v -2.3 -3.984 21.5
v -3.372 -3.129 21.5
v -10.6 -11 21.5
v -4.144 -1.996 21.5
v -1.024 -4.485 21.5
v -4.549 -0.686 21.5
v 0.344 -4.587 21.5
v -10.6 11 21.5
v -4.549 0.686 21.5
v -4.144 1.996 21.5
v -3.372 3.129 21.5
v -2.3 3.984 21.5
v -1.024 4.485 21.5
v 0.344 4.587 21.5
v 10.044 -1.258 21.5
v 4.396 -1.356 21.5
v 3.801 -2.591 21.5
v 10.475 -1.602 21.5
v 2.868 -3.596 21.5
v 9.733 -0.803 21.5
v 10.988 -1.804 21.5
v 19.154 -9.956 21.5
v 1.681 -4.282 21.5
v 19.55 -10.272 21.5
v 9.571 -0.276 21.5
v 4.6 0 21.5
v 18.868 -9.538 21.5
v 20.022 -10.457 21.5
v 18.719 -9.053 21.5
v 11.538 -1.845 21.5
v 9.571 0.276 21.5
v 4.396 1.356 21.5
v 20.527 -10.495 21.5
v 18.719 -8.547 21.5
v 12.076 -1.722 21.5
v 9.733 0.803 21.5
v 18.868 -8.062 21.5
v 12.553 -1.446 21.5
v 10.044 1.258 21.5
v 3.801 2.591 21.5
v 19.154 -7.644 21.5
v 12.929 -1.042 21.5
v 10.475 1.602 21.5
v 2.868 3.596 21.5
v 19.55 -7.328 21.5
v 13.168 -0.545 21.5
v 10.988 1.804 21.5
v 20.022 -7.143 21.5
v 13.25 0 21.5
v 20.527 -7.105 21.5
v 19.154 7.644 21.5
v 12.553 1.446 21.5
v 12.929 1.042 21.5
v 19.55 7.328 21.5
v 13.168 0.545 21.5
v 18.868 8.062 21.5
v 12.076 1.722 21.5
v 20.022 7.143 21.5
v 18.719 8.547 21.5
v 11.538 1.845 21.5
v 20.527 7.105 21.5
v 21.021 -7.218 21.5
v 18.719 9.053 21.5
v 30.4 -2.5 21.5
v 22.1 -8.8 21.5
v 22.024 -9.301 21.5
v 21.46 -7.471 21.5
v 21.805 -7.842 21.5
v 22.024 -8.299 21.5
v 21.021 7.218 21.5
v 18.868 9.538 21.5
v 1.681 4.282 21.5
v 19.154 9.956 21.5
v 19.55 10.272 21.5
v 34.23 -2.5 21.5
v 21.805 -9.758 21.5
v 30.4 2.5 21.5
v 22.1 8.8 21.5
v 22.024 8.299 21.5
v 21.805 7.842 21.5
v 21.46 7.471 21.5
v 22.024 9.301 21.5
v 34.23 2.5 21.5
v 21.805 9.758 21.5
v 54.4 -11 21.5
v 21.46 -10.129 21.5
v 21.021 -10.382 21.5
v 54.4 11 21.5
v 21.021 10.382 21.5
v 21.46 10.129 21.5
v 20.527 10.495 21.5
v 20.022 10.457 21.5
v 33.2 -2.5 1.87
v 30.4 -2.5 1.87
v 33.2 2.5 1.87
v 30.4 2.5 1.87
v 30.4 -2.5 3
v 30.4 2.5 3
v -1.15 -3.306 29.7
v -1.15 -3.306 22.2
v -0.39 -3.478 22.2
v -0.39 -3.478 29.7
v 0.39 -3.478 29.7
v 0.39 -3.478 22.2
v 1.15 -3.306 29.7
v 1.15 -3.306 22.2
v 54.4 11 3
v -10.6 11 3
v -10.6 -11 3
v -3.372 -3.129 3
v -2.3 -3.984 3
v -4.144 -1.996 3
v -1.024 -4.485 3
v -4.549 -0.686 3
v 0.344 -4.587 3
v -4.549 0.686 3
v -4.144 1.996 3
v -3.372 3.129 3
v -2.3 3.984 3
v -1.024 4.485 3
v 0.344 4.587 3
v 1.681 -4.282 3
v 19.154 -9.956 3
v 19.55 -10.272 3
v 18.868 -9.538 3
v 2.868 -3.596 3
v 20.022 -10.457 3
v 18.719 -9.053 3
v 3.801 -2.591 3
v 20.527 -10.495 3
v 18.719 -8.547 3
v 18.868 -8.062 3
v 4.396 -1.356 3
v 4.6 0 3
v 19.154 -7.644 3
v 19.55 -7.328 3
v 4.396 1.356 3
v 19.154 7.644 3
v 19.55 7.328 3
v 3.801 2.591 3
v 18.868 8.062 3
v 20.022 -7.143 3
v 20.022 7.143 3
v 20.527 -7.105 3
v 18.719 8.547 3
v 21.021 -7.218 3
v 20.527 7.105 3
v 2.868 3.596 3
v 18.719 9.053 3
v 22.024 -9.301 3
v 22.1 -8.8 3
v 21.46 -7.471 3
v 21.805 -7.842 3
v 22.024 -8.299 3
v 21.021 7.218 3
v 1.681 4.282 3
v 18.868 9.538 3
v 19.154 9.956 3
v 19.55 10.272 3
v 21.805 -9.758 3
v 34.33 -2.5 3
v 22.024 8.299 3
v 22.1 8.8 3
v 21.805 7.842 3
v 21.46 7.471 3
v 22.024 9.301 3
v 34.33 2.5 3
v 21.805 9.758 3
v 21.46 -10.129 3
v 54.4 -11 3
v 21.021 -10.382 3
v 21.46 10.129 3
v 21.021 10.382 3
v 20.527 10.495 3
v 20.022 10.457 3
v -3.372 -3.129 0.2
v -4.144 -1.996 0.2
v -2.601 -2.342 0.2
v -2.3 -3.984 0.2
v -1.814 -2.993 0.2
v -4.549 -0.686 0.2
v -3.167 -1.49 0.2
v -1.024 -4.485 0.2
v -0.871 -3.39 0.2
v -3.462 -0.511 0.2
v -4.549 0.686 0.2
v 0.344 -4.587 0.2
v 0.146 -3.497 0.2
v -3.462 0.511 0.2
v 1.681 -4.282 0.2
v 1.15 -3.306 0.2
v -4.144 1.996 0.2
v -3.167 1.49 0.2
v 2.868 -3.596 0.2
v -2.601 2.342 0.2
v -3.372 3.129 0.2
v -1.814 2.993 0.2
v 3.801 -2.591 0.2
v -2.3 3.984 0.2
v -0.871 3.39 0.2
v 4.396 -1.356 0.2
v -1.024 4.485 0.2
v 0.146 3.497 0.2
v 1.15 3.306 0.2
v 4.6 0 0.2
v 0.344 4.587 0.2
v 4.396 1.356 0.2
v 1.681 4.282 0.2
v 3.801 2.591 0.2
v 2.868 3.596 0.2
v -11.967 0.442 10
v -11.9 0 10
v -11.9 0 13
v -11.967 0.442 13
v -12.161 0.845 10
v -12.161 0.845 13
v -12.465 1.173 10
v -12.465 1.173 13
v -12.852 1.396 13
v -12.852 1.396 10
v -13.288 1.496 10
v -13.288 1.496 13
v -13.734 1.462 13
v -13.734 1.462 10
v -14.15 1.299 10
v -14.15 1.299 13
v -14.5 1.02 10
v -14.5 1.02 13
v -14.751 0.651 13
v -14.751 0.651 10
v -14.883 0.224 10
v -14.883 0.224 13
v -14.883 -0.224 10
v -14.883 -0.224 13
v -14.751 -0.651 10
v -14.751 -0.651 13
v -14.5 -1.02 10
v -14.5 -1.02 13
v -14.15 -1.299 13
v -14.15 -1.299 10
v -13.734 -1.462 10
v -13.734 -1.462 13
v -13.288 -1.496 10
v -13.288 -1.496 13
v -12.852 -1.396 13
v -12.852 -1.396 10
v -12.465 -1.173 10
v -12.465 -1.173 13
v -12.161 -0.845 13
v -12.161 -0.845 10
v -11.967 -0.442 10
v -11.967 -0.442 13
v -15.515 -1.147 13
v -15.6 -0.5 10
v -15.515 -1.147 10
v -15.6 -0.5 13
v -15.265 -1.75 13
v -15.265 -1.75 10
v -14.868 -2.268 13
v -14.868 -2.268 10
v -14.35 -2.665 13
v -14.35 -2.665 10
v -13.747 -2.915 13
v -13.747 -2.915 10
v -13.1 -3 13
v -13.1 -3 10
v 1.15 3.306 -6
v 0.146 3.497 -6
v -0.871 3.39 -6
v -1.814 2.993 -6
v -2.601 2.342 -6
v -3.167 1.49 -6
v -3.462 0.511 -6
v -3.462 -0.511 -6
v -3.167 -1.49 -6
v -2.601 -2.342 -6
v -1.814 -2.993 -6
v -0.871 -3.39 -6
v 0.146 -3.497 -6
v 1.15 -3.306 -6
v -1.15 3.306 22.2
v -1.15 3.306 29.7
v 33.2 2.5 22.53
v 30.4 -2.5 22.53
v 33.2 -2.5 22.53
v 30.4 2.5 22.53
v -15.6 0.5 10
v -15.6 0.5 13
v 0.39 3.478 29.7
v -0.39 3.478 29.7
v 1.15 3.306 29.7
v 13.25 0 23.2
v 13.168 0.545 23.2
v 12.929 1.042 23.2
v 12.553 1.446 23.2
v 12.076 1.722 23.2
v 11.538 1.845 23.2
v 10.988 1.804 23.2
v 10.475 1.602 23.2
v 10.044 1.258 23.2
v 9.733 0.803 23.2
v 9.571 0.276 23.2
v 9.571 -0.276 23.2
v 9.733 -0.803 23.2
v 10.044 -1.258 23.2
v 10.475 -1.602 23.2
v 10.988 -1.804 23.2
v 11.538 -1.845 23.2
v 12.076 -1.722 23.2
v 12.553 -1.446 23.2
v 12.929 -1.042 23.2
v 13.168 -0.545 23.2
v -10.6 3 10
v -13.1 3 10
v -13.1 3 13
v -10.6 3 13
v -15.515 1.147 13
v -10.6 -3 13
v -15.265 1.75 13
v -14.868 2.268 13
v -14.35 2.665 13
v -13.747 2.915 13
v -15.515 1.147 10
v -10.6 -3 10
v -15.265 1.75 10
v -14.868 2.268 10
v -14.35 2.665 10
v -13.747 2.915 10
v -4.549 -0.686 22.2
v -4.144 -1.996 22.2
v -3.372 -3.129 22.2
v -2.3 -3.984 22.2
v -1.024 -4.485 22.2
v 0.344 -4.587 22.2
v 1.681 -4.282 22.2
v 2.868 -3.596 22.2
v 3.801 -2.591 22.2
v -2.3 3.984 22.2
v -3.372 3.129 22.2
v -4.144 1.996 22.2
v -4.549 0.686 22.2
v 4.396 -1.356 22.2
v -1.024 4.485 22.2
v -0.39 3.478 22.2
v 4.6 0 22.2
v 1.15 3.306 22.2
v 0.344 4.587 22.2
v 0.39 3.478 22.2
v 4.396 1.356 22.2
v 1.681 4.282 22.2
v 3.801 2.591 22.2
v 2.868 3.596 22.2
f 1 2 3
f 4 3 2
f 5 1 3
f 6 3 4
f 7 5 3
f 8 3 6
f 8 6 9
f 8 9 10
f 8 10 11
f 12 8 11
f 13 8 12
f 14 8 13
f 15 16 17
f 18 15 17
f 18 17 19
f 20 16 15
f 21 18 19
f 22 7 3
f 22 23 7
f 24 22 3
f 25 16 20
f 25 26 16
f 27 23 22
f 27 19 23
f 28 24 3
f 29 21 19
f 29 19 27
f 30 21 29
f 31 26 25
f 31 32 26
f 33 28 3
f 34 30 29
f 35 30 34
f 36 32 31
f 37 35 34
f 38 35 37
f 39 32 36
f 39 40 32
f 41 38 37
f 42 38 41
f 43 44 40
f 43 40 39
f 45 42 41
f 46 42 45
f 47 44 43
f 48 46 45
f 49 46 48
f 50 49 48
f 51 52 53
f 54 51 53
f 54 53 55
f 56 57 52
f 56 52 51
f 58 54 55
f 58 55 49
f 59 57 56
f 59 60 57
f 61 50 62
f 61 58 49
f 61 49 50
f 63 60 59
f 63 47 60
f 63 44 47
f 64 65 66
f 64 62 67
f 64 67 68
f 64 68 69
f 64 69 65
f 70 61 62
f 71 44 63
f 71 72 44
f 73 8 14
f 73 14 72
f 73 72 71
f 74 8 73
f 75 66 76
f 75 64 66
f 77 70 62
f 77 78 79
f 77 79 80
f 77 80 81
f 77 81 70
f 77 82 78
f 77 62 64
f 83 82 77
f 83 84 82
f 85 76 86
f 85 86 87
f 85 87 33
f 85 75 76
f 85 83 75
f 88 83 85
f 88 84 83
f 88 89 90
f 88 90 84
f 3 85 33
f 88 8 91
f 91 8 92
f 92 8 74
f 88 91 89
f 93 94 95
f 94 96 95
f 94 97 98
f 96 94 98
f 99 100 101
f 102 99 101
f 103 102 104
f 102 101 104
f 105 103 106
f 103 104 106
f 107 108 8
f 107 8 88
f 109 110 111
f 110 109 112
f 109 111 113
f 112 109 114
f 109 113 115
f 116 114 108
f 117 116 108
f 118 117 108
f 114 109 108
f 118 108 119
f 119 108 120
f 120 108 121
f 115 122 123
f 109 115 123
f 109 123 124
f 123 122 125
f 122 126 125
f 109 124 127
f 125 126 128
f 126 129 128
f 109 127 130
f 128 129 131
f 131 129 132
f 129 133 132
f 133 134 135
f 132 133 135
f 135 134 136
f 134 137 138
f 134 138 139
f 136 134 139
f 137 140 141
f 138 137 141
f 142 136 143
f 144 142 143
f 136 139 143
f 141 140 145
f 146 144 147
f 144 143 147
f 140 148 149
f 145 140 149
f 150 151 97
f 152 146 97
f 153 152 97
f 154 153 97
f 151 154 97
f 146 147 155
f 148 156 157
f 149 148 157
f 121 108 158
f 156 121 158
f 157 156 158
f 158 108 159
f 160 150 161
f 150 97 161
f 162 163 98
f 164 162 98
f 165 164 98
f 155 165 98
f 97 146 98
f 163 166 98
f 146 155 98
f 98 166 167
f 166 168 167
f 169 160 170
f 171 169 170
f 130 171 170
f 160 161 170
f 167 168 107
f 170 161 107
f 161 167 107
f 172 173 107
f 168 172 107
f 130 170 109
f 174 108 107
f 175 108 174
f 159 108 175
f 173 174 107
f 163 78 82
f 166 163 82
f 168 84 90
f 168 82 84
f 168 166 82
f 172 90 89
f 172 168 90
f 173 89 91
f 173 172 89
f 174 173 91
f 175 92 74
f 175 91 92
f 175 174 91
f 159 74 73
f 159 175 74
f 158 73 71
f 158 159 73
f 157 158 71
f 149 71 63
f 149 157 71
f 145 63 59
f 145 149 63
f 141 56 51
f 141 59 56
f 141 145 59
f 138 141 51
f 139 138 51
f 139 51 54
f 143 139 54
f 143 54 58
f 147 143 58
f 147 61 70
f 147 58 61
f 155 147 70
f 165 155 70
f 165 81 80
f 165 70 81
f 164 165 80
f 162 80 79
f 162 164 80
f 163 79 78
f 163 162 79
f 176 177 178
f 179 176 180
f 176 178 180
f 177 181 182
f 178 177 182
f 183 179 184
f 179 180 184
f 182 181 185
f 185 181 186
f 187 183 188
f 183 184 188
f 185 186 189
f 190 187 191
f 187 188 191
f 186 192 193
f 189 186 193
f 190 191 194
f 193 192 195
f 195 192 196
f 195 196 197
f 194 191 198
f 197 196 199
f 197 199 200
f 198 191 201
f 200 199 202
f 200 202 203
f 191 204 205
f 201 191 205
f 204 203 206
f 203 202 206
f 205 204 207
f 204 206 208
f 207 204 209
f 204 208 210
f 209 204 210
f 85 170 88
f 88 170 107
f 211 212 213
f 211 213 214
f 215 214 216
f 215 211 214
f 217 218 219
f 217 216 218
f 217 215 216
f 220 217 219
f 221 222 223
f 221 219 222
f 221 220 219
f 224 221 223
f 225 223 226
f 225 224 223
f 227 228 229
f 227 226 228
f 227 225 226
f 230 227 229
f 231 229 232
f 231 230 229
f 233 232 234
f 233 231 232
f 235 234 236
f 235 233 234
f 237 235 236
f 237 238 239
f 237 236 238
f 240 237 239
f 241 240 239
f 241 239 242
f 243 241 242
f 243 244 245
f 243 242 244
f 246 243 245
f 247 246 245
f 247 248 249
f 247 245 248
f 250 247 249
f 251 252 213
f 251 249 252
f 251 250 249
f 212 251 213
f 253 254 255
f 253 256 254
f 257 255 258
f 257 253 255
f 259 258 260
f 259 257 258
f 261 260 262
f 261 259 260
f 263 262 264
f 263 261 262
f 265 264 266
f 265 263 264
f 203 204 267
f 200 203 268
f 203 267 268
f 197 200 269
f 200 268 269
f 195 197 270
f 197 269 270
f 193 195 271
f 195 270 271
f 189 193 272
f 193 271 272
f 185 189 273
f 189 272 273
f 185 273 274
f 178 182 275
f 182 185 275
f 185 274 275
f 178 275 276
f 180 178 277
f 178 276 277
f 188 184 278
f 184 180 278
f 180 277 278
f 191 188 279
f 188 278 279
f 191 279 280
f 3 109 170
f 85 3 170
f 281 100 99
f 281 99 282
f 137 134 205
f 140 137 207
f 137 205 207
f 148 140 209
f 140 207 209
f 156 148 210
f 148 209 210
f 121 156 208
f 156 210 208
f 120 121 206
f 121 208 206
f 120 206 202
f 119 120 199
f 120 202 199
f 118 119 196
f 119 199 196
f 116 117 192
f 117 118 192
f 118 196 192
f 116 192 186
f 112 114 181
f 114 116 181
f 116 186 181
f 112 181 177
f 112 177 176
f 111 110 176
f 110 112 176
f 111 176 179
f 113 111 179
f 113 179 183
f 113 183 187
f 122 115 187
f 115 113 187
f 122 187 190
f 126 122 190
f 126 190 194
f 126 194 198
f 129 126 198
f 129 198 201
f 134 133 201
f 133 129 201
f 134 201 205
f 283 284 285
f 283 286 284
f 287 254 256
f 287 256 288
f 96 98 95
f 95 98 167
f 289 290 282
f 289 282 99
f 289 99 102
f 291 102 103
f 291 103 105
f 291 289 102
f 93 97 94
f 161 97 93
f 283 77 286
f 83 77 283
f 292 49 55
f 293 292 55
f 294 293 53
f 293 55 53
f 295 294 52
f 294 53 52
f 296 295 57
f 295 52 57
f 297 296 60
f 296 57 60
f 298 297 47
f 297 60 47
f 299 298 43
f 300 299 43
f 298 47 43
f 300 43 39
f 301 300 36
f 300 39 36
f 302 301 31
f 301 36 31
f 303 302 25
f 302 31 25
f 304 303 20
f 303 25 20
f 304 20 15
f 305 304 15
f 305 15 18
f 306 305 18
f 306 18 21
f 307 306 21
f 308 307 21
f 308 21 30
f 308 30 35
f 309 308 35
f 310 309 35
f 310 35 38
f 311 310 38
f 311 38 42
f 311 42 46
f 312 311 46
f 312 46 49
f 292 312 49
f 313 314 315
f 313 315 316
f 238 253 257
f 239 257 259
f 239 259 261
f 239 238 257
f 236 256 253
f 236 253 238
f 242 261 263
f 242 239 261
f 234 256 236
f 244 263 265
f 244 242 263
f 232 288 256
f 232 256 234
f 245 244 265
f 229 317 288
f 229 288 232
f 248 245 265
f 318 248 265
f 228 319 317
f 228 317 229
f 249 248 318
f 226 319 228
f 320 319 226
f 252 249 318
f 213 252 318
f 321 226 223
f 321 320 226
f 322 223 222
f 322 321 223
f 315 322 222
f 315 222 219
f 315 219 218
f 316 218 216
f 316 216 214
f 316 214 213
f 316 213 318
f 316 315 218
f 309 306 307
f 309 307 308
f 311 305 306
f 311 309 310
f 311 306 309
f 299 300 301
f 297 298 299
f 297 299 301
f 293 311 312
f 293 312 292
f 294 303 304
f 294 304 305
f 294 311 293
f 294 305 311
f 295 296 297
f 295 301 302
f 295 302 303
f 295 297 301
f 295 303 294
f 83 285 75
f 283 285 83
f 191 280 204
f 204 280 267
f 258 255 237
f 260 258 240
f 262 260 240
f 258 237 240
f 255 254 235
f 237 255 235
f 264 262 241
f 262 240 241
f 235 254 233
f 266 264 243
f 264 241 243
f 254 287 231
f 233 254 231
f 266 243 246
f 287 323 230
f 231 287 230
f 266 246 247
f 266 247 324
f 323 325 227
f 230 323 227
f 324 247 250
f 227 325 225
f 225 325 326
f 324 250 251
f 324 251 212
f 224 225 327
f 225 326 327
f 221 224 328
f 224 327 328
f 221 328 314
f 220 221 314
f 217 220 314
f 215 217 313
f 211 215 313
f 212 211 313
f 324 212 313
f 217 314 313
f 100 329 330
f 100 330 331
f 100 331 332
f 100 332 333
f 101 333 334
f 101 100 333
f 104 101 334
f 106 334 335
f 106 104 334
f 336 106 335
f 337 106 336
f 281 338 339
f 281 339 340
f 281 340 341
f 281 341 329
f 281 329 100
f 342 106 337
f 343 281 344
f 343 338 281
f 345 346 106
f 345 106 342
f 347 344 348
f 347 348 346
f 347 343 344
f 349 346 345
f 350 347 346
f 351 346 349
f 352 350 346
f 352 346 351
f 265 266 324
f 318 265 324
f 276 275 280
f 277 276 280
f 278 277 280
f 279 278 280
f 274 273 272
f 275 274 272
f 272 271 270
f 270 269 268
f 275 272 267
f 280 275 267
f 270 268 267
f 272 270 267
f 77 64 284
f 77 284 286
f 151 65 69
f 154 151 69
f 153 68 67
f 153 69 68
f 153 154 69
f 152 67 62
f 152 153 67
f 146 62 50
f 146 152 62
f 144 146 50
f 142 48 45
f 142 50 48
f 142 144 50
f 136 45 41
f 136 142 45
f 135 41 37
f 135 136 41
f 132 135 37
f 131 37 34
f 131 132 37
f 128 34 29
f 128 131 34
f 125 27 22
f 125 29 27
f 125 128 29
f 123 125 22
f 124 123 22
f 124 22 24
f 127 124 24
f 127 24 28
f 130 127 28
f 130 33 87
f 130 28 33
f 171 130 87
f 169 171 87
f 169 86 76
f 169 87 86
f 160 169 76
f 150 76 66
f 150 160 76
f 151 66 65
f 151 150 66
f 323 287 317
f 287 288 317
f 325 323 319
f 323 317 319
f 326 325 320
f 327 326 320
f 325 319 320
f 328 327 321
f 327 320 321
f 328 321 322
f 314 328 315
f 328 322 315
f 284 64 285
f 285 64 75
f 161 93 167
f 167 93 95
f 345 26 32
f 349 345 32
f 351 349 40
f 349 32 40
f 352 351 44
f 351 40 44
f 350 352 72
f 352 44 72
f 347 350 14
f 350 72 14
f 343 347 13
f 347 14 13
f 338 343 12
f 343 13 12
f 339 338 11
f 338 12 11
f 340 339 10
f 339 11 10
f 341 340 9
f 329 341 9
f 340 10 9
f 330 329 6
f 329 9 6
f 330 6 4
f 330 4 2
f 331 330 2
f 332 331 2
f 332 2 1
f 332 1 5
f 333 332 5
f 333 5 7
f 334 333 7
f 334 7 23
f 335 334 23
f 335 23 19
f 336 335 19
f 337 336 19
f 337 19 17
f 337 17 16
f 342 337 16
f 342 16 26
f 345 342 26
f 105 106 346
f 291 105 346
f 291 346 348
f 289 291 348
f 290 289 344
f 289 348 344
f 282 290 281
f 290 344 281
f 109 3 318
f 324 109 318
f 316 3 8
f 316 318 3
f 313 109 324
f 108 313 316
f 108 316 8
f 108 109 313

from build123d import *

# Parameters (mm, degrees)
BOX007_W          = 4.3
BOX007_H          = 5
BOX007_DEPTH      = 2
CHAMFER001_SIZE   = 1.5
BOX006_W          = 4.3
BOX006_H          = 5
BOX006_DEPTH      = 2
CHAMFER_SIZE      = 1.5
BOX003_W          = 10
BOX003_H          = 10
BOX003_DEPTH      = 40
BOX002_W          = 10
BOX002_H          = 10
BOX002_DEPTH      = 40
CYLINDER010_R     = 3.5
CYLINDER010_DEPTH = 35.7
CYLINDER008_R     = 4.6
CYLINDER008_DEPTH = 22
CYLINDER006_R     = 1.85
CYLINDER006_DEPTH = 10
CYLINDER003_R     = 1.7
CYLINDER003_DEPTH = 50
CYLINDER002_R     = 1.7
CYLINDER002_DEPTH = 50
CYLINDER_R        = 1.5
CYLINDER_DEPTH    = 10
BOX001_W          = 10
BOX001_H          = 6
BOX001_DEPTH      = 3
FILLET_R          = 2.5
FILLET001_R       = 2.5
BOX_W             = 65
BOX_H             = 22
BOX_DEPTH         = 18.5


with BuildPart() as chamfer001:
    # Box007 → Box007 (new body)
    with BuildSketch(Plane(origin=(41, -2.5, 17.53), x_dir=(1, 0, 0), z_dir=(0, 0, 1))):
        with Locations((2.15, 2.5)):
            Rectangle(BOX007_W, BOX007_H)
    extrude(amount=BOX007_DEPTH)

    # Chamfer001
    chamfer001_edges = [chamfer001.edges().sort_by_distance(p)[0] for p in [
        (45.3, 0, 19.53),
    ]]
    chamfer(chamfer001_edges, length=CHAMFER001_SIZE)


with BuildPart() as part_mirroring:
    # Part__Mirroring: instance of Chamfer001
    add(chamfer001.part.mirror(Plane(origin=(0, 0, 0), x_dir=(0, 1, 0), z_dir=(0, 0, 1))))


with BuildPart() as part_mirroring_1:
    # Part__Mirroring placement: moved
    add(part_mirroring.part.moved(Location((0, 0, 18.4))))


with BuildPart() as fusion004:
    # Box006 → Box006 (new body)
    with BuildSketch(Plane(origin=(41, -2.5, 17.53), x_dir=(1, 0, 0), z_dir=(0, 0, 1))):
        with Locations((2.15, 2.5)):
            Rectangle(BOX006_W, BOX006_H)
    extrude(amount=BOX006_DEPTH)

    # Chamfer
    chamfer_edges = [fusion004.edges().sort_by_distance(p)[0] for p in [
        (45.3, 0, 19.53),
    ]]
    chamfer(chamfer_edges, length=CHAMFER_SIZE)

    # Fusion004: union Part__Mirroring
    add(part_mirroring_1.part)


with BuildPart() as cube003:
    # Box003 → Box003 (new body)
    with BuildSketch(Plane(origin=(-0.55, -5, 5), x_dir=(1, 0, 0), z_dir=(0, 0, 1))):
        with Locations((5, 5)):
            Rectangle(BOX003_W, BOX003_H)
    extrude(amount=BOX003_DEPTH)


with BuildPart() as cube002:
    # Box002 → Box002 (new body)
    with BuildSketch(Plane(origin=(11.75, -5, -11), x_dir=(1, 0, 0), z_dir=(0, 0, 1))):
        with Locations((5, 5)):
            Rectangle(BOX002_W, BOX002_H)
    extrude(amount=BOX002_DEPTH)


with BuildPart() as cut004:
    # Cylinder010 → Cylinder010 (new body)
    with BuildSketch(Plane(origin=(10.6, 0, -9), x_dir=(1, 0, 0), z_dir=(0, 0, 1))):
        Circle(CYLINDER010_R)
    extrude(amount=CYLINDER010_DEPTH)

    # Cut003: cut Cube002
    add(cube002.part, mode=Mode.SUBTRACT)

    # Cut004: cut Cube003
    add(cube003.part, mode=Mode.SUBTRACT)


with BuildPart() as cylinder004:
    # Cylinder008 → Cylinder008 (new body)
    with BuildSketch(Plane(origin=(10.6, 0, -2.8), x_dir=(1, 0, 0), z_dir=(0, 0, 1))):
        Circle(CYLINDER008_R)
    extrude(amount=CYLINDER008_DEPTH)


with BuildPart() as cylinder003:
    # Cylinder006 → Cylinder006 (new body)
    with BuildSketch(Plane(origin=(22, 0, 10.2), x_dir=(1, 0, 0), z_dir=(0, 0, 1))):
        Circle(CYLINDER006_R)
    extrude(amount=CYLINDER006_DEPTH)


with BuildPart() as cylinder002:
    # Cylinder003 → Cylinder003 (new body)
    with BuildSketch(Plane(origin=(31, -8.8, -25), x_dir=(1, 0, 0), z_dir=(0, 0, 1))):
        Circle(CYLINDER003_R)
    extrude(amount=CYLINDER003_DEPTH)


with BuildPart() as cylinder001:
    # Cylinder002 → Cylinder002 (new body)
    with BuildSketch(Plane(origin=(31, 8.8, -25), x_dir=(1, 0, 0), z_dir=(0, 0, 1))):
        Circle(CYLINDER002_R)
    extrude(amount=CYLINDER002_DEPTH)


with BuildPart() as cylinder:
    # Cylinder → Cylinder (new body)
    with BuildSketch(Plane(origin=(-2.8, 0, 3), x_dir=(1, 0, 0), z_dir=(0, 0, 1))):
        Circle(CYLINDER_R)
    extrude(amount=CYLINDER_DEPTH)


with BuildPart() as fillet001:
    # Box001 → Box001 (new body)
    with BuildSketch(Plane(origin=(-5, -3, 7), x_dir=(1, 0, 0), z_dir=(0, 0, 1))):
        with Locations((5, 3)):
            Rectangle(BOX001_W, BOX001_H)
    extrude(amount=BOX001_DEPTH)

    # Cut: cut Cylinder
    add(cylinder.part, mode=Mode.SUBTRACT)

    # Fillet
    fillet_edges = [fillet001.edges().sort_by_distance(p)[0] for p in [
        (-5, -3, 8.5),
    ]]
    fillet(fillet_edges, radius=FILLET_R)

    # Fillet001
    fillet001_edges = [fillet001.edges().sort_by_distance(p)[0] for p in [
        (-5, 3, 8.5),
    ]]
    fillet(fillet001_edges, radius=FILLET001_R)


with BuildPart() as motor:
    # Box → Box (new body)
    with BuildSketch(Plane(origin=(0, -11, 0), x_dir=(1, 0, 0), z_dir=(0, 0, 1))):
        with Locations((32.5, 11)):
            Rectangle(BOX_W, BOX_H)
    extrude(amount=BOX_DEPTH)

    # Fusion: union Fillet001
    add(fillet001.part)

    # Cut001: cut Cylinder001
    add(cylinder001.part, mode=Mode.SUBTRACT)

    # Cut002: cut Cylinder002
    add(cylinder002.part, mode=Mode.SUBTRACT)

    # Fusion001: union Cylinder003
    add(cylinder003.part)

    # Fusion002: union Cylinder004
    add(cylinder004.part)

    # Fusion003: union Cut004
    add(cut004.part)

    # Fusion006: union Fusion004
    add(fusion004.part)


with BuildPart() as motor_1:
    # Fusion006 placement: moved
    add(motor.part.moved(Location((-10.6, 0, 3))))


solid = motor_1.part
